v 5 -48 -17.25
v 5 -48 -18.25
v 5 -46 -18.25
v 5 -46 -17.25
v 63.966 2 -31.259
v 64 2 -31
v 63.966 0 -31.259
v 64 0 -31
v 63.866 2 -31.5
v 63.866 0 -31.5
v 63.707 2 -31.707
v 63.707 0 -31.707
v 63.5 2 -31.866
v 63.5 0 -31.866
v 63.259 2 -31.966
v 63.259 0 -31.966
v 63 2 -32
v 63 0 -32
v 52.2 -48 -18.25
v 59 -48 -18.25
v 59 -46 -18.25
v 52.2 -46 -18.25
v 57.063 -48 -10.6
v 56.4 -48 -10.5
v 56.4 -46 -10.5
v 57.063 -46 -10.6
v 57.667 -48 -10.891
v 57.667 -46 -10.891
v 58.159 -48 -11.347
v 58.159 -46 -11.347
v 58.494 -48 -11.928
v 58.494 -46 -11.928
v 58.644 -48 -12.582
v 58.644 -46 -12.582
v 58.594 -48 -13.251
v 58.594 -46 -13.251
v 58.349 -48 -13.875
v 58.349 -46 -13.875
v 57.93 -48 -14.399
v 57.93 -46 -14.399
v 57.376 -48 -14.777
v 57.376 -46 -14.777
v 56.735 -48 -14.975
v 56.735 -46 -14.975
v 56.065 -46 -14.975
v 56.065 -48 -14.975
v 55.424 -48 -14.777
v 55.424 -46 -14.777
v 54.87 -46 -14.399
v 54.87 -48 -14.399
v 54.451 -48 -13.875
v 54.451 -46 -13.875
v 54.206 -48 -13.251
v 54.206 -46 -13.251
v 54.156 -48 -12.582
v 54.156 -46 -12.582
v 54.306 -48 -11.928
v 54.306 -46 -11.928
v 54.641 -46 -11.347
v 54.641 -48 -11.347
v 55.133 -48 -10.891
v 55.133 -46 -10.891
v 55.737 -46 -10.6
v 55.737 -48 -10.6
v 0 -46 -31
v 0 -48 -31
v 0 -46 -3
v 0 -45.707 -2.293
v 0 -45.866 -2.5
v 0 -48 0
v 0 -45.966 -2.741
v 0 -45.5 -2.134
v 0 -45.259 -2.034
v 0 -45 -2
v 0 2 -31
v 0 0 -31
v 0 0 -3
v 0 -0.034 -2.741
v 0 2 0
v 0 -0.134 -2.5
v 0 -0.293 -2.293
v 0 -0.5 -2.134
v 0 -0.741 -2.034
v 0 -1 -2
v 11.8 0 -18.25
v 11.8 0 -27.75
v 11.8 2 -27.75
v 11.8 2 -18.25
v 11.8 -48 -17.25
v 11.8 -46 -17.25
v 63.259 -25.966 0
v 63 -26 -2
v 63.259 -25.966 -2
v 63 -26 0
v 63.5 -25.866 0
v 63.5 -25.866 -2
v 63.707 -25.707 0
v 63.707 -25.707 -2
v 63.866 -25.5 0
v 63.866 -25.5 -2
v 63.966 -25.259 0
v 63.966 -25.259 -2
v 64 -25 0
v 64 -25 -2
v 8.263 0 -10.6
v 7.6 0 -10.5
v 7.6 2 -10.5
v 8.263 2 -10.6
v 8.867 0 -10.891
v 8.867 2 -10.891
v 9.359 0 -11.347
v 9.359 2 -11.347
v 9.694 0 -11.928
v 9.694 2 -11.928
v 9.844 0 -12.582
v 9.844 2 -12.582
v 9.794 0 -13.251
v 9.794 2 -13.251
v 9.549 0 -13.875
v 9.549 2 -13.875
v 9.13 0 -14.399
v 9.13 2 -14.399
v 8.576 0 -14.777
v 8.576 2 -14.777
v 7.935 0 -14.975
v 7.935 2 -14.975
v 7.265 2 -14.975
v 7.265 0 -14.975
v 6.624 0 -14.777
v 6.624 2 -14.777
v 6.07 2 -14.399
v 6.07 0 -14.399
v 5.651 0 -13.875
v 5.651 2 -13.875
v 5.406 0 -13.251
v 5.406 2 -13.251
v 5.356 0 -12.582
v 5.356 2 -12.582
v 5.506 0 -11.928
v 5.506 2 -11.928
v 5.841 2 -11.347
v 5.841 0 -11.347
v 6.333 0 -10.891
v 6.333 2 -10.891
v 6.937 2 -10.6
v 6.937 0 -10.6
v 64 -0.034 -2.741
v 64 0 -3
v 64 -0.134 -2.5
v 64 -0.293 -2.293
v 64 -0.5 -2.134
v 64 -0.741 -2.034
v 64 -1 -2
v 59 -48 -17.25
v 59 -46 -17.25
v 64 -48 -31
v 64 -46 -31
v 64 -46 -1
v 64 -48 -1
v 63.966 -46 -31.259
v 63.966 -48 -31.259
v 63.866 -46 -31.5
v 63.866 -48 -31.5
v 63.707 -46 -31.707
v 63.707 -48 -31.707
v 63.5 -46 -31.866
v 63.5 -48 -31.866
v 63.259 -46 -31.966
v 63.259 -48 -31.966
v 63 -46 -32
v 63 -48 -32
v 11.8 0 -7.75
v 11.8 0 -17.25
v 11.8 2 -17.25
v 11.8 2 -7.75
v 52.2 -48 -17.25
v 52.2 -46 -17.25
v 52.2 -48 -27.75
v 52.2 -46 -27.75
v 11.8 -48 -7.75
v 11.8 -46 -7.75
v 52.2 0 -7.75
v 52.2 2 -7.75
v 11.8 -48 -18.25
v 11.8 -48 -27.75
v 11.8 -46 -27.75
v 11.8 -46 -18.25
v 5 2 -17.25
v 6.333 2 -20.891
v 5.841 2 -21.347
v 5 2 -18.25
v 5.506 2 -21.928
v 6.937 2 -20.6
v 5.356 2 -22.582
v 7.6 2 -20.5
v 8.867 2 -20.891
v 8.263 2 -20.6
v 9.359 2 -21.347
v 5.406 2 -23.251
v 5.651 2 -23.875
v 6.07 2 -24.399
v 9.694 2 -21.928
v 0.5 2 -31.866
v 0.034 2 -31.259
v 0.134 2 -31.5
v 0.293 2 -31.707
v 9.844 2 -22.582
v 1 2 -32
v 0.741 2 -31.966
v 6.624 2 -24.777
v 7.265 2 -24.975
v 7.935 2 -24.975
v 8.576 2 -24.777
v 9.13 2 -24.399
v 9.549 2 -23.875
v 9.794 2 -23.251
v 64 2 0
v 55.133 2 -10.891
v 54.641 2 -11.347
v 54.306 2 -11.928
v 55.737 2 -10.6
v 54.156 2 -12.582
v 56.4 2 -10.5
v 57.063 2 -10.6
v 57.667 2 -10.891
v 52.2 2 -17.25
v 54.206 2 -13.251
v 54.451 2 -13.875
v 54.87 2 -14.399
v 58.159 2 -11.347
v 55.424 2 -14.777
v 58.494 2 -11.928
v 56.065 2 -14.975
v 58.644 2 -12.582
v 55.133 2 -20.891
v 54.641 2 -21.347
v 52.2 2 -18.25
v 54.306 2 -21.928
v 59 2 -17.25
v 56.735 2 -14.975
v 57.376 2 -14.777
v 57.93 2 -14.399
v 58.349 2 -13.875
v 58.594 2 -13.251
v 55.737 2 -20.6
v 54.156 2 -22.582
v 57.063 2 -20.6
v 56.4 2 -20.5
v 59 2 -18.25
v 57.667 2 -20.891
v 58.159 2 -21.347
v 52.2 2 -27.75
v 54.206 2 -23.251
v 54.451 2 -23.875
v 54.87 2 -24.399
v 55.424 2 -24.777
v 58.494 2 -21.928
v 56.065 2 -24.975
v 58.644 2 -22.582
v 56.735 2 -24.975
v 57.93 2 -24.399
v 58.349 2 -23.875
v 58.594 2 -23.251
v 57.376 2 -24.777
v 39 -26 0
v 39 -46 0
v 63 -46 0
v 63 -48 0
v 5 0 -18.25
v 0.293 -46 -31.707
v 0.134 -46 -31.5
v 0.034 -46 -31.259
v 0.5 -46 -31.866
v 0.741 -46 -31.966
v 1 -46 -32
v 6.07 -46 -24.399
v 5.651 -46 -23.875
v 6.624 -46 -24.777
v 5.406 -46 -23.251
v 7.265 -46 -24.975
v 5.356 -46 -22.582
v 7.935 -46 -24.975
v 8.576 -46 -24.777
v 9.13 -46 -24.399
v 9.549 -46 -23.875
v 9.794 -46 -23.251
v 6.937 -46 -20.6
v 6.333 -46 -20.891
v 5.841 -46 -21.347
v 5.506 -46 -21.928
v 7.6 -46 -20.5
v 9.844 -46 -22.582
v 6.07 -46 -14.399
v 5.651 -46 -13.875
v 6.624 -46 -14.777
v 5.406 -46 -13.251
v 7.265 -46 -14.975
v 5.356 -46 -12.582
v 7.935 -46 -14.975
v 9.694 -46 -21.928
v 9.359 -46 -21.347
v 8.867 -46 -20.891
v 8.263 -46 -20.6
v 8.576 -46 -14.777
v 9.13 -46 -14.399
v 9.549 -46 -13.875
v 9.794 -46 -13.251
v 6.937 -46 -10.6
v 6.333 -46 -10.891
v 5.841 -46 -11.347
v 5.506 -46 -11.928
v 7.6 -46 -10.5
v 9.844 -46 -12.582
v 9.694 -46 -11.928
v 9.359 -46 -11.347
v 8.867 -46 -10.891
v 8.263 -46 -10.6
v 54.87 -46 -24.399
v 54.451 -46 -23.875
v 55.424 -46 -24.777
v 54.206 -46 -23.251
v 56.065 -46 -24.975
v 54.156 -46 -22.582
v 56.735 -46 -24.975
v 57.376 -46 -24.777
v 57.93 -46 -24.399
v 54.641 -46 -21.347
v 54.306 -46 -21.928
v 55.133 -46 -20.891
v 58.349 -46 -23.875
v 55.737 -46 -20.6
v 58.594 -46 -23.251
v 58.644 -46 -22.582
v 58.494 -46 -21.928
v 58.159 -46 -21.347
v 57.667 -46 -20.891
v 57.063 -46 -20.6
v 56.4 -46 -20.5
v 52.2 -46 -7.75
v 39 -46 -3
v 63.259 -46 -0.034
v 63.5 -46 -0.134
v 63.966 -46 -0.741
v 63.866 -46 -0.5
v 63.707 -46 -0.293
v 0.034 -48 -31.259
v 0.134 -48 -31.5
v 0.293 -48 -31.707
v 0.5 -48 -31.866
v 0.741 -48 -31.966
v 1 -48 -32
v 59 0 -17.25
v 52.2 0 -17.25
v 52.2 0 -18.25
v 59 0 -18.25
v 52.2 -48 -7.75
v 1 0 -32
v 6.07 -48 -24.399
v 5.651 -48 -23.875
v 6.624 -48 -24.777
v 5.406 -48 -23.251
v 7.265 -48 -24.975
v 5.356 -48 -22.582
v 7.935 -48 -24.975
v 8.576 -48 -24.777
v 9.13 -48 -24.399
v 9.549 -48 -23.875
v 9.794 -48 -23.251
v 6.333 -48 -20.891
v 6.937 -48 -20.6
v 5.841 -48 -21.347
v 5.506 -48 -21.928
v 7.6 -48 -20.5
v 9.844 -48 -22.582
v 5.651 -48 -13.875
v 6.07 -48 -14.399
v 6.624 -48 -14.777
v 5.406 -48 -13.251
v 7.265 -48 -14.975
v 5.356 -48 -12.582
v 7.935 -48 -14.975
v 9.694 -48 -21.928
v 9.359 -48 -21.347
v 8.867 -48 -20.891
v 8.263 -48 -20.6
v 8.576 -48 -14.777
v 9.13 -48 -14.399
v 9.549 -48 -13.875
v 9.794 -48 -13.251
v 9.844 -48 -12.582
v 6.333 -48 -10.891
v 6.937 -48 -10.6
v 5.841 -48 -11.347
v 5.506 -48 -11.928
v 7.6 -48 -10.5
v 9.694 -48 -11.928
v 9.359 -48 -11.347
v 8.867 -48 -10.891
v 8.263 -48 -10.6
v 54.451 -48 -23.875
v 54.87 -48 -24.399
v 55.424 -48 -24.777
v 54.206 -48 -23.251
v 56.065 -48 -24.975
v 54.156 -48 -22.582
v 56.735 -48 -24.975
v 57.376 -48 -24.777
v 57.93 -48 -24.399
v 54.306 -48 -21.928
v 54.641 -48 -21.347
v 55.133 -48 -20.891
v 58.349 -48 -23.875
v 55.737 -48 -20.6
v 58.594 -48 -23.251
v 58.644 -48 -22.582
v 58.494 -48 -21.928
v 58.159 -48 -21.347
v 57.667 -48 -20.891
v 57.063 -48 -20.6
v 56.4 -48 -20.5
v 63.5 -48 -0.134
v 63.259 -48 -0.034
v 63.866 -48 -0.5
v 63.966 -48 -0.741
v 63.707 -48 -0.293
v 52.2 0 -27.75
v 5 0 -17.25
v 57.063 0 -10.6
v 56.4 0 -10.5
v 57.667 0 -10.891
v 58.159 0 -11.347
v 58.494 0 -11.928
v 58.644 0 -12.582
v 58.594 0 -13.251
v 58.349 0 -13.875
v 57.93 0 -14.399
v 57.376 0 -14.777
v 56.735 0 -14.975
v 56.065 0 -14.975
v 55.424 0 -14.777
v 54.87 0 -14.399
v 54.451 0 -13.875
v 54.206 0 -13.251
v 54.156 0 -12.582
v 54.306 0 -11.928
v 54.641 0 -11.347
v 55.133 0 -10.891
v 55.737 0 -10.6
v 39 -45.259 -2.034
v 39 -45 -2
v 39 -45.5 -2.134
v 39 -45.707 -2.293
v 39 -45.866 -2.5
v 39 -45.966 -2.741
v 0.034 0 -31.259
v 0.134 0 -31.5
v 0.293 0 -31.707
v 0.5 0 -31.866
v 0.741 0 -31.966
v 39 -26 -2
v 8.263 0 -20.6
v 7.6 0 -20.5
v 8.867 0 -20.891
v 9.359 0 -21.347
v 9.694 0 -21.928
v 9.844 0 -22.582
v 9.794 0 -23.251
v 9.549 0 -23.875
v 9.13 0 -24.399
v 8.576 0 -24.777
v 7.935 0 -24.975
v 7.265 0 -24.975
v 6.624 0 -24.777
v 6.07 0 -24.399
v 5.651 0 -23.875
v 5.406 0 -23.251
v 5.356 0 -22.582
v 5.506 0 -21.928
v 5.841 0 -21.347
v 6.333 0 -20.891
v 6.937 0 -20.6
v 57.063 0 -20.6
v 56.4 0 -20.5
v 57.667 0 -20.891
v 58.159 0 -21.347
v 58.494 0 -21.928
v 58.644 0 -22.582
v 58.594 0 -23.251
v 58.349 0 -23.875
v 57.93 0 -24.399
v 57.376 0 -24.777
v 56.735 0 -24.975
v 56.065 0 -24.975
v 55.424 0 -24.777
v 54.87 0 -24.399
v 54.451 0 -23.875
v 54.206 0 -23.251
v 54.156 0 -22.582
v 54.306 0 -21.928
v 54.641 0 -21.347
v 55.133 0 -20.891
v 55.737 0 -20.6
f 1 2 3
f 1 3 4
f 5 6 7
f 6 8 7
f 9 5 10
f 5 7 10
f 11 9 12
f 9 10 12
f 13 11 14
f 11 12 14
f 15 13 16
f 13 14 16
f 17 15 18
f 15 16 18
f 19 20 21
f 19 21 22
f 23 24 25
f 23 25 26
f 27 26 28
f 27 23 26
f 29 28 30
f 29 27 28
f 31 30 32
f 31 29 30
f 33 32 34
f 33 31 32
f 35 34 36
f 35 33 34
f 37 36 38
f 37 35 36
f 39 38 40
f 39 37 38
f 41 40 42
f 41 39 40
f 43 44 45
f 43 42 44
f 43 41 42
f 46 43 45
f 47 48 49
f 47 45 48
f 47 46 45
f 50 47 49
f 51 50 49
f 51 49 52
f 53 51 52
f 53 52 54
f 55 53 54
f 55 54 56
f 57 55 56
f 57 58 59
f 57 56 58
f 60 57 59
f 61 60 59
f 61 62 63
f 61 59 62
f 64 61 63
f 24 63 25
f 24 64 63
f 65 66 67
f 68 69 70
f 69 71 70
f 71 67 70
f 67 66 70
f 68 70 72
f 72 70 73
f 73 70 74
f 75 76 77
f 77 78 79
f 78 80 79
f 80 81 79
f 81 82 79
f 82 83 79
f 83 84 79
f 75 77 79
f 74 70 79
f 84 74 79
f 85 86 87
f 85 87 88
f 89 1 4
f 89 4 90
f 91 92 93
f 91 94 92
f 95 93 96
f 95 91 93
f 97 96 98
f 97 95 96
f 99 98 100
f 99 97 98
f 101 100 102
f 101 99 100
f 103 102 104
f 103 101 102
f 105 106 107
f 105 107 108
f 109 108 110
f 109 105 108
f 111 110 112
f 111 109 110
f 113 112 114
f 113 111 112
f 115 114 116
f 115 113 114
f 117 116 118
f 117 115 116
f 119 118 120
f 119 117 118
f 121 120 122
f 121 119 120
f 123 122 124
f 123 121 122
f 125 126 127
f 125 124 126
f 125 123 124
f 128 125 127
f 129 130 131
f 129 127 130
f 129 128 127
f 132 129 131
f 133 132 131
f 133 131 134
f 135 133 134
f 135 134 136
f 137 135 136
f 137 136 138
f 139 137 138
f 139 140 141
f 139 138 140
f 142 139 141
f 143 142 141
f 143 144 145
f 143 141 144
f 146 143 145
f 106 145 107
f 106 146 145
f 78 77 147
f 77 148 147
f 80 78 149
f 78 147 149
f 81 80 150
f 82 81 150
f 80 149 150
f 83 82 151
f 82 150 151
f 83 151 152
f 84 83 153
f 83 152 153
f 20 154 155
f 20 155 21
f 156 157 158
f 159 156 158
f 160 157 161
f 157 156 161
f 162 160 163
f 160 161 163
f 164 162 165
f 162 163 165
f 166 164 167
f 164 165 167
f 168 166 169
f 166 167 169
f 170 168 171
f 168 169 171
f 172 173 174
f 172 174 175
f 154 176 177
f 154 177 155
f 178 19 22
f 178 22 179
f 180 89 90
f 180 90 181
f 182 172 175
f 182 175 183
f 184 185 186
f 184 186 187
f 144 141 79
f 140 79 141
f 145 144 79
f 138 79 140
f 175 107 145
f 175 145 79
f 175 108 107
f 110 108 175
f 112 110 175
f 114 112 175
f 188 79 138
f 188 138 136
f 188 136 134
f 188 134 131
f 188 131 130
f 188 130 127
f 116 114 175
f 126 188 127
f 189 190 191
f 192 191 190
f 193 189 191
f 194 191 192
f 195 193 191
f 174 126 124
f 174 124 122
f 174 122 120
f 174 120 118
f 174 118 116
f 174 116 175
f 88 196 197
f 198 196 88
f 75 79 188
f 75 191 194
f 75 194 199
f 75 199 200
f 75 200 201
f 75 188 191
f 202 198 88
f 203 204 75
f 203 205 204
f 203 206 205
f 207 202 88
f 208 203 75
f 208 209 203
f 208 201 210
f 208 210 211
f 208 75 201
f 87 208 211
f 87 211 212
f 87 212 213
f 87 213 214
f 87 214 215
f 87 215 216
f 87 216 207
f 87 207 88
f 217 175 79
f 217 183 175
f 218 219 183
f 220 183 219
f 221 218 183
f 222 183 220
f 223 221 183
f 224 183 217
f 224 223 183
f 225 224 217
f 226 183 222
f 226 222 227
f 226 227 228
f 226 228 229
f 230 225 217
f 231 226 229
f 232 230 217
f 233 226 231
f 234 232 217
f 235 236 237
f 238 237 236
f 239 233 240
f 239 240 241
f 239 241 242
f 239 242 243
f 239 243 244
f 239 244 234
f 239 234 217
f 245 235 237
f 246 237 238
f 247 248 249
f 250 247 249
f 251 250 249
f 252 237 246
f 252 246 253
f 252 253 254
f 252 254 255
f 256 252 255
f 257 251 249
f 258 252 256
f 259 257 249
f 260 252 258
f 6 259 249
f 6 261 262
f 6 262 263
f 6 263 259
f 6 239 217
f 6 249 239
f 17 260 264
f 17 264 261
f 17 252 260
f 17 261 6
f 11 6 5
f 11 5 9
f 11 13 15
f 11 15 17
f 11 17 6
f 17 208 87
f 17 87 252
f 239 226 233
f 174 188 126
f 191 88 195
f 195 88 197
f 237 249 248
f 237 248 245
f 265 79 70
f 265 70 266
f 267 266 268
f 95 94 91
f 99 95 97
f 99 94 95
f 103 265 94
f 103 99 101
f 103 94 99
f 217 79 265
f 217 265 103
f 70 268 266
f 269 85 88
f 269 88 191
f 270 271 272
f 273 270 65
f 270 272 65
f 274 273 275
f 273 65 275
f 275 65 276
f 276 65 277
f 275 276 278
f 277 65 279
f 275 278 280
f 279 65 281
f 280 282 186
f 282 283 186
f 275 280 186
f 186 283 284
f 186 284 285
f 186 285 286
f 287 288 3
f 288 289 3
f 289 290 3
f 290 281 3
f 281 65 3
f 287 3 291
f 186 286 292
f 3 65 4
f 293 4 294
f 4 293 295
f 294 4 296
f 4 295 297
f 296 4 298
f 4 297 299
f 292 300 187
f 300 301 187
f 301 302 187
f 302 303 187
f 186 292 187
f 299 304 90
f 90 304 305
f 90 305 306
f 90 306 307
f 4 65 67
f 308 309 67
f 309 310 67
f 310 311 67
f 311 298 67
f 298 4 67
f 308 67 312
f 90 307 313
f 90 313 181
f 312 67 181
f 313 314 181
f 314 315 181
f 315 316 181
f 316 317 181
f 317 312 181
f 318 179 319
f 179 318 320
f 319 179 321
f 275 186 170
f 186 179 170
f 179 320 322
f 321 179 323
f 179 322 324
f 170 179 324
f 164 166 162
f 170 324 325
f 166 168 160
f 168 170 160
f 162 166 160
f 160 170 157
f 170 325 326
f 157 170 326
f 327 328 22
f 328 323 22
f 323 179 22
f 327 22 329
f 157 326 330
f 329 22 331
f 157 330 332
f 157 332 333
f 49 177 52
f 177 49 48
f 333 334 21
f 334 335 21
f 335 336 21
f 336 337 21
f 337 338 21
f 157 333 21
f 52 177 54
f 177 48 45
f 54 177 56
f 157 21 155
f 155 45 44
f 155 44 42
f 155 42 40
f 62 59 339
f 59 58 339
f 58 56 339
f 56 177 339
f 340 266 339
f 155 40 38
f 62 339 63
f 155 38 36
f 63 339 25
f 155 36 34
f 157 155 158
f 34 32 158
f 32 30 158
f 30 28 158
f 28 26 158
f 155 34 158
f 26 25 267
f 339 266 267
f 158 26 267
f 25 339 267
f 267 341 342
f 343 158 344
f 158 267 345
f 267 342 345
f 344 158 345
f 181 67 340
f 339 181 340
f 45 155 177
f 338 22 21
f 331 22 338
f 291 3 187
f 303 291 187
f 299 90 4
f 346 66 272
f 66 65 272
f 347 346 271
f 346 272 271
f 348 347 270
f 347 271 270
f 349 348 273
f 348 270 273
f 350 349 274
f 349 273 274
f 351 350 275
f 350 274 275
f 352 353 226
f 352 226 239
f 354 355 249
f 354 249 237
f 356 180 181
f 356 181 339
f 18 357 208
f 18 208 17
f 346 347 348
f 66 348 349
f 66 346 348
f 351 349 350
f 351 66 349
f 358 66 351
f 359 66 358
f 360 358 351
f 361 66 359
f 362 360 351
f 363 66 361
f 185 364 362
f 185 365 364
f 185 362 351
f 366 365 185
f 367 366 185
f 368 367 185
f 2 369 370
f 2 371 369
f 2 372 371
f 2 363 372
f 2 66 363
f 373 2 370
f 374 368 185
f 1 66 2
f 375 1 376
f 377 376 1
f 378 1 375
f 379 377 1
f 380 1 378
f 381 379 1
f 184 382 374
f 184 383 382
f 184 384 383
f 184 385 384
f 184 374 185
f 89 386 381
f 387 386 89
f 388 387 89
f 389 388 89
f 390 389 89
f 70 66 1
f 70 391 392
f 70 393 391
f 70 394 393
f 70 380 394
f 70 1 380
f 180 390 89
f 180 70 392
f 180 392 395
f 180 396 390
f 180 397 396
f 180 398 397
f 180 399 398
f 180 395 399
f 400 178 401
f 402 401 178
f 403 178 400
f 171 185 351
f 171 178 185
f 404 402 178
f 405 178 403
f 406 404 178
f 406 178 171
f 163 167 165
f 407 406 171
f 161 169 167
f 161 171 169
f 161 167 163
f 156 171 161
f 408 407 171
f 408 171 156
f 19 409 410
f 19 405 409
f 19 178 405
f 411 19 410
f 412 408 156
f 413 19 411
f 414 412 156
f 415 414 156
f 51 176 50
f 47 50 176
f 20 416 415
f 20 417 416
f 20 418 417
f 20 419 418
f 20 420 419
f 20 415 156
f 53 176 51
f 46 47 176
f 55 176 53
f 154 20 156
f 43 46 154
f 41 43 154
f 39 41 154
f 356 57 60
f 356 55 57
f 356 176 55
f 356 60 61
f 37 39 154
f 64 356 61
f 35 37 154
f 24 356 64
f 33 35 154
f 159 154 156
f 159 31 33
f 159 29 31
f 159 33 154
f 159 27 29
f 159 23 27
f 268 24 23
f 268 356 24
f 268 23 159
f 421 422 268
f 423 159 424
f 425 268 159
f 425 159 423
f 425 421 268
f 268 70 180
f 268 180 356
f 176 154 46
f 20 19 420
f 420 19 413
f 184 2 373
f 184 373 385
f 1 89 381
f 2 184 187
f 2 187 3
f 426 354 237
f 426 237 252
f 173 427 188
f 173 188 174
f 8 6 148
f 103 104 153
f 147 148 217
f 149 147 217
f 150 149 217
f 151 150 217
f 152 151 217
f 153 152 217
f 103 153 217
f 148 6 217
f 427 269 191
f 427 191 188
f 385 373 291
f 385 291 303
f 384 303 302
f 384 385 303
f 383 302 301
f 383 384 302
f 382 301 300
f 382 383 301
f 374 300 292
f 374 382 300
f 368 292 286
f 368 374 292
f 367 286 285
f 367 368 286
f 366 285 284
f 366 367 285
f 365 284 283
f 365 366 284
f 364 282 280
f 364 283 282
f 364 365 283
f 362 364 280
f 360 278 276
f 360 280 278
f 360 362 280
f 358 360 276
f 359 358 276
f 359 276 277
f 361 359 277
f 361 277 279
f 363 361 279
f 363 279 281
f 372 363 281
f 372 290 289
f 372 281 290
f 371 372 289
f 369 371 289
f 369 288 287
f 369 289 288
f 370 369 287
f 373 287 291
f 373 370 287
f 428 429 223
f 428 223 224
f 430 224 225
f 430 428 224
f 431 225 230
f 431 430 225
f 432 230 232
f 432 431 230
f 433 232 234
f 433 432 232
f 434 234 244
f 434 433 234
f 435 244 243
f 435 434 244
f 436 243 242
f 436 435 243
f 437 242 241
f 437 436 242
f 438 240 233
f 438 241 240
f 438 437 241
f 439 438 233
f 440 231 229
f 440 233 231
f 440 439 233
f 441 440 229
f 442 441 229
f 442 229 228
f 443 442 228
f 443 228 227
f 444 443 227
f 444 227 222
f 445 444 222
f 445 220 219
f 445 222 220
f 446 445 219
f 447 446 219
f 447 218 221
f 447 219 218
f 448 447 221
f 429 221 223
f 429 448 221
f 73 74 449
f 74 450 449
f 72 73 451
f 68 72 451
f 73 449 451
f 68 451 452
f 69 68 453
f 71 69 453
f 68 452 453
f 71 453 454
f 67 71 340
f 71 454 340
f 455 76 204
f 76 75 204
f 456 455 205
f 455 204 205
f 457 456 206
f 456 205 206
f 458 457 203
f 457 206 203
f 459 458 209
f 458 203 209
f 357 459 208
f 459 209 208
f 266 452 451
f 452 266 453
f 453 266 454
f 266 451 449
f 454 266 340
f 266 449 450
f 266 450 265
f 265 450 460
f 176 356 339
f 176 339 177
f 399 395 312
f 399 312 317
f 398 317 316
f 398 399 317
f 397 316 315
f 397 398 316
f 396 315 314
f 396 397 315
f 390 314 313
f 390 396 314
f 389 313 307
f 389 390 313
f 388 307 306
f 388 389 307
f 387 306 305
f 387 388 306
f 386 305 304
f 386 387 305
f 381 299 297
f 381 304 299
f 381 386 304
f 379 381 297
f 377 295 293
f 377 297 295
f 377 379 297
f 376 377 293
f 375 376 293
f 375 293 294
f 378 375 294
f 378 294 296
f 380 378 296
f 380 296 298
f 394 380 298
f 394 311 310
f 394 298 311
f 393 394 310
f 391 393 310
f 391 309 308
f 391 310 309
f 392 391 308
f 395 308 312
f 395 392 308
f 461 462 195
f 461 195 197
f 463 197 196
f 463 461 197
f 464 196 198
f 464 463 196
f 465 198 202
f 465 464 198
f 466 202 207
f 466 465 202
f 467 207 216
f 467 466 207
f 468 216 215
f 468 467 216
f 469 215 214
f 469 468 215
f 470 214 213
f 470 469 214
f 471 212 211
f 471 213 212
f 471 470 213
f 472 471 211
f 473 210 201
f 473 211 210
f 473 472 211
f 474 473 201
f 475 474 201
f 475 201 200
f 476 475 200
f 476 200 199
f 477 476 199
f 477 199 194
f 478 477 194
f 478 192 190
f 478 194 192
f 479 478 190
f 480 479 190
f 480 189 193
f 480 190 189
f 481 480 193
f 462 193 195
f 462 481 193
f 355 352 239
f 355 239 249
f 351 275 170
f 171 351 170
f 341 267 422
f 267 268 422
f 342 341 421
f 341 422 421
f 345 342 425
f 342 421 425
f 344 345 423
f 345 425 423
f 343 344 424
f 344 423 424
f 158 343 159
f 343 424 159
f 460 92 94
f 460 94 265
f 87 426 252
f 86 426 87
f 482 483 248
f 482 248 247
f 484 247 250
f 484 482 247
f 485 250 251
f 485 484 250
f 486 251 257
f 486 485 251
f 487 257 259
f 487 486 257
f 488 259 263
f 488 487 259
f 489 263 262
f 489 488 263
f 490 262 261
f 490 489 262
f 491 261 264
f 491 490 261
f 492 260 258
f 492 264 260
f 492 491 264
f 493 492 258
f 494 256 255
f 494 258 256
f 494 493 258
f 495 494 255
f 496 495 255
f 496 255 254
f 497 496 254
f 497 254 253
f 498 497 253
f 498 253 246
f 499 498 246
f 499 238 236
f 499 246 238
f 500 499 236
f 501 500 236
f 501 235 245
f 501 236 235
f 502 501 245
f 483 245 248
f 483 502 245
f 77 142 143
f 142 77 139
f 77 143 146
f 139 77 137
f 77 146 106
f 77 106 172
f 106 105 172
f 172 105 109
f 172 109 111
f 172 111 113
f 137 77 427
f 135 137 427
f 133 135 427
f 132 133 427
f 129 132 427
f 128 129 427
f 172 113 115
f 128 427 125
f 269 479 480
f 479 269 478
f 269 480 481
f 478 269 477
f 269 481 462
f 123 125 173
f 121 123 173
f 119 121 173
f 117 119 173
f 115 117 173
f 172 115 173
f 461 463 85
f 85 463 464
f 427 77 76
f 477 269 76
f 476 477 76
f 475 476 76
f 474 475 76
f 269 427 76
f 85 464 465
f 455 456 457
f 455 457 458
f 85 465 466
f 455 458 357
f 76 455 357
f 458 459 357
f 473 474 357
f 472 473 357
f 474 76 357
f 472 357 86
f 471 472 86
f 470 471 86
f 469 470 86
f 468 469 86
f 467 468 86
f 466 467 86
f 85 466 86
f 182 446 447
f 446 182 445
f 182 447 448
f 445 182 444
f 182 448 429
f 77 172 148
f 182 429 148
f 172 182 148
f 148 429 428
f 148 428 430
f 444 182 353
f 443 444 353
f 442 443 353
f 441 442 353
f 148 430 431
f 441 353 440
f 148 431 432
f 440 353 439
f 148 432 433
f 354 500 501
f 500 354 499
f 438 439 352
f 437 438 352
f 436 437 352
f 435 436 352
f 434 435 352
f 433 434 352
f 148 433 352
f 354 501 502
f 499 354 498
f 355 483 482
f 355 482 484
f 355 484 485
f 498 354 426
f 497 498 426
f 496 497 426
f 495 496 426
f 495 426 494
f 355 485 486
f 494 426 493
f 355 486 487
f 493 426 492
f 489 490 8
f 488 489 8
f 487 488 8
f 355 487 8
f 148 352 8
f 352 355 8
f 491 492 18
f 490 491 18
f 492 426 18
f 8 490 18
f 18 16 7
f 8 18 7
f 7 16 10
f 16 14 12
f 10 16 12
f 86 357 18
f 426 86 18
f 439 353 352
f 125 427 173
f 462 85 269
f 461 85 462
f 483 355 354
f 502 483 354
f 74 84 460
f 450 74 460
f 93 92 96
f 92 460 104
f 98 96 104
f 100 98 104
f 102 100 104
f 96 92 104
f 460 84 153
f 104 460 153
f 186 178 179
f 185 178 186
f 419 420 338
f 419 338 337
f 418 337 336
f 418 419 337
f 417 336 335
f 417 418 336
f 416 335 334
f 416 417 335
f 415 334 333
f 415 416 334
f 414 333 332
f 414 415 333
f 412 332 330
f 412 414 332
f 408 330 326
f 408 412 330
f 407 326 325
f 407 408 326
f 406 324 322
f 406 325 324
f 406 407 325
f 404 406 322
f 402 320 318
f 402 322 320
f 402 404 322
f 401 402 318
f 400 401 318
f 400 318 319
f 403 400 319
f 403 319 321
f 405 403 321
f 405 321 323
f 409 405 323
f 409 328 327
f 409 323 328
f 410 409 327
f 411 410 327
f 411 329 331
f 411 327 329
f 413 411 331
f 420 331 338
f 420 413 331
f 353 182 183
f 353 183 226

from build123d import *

# Parameters (mm, degrees)
SKETCH1_W               = 100
SKETCH1_H               = 32
BOSS_EXTRUDE1_DEPTH     = 2
SKETCH2_W               = 100
SKETCH2_H               = 2
BOSS_EXTRUDE2_DEPTH     = 46
SKETCH3_W               = 100
SKETCH3_H               = 2
BOSS_EXTRUDE3_DEPTH     = 32
CUT_EXTRUDE1_DEPTH      = 117.292734081
CUT_EXTRUDE1_DEPTH_BACK = 117.292734081
SKETCH4_R               = 2.25
CUT_EXTRUDE2_DEPTH      = 117.292734081
CUT_EXTRUDE2_DEPTH_BACK = 117.292734081
SKETCH5_W               = 36
SKETCH5_H               = 32
SKETCH6_W               = 25
SKETCH6_H               = 20
CUT_EXTRUDE3_DEPTH      = 2
FILLET1_R               = 1


with BuildPart() as part:
    # Sketch1 → Boss-Extrude1 (new body)
    with BuildSketch(Plane(origin=(0, 0, 0), x_dir=(1, 0, 0), z_dir=(0, 1, 0))):
        with Locations((50, 16)):
            Rectangle(SKETCH1_W, SKETCH1_H)
    extrude(amount=BOSS_EXTRUDE1_DEPTH)

    # Sketch2 → Boss-Extrude2 (add)
    with BuildSketch(Plane.XZ):
        with Locations((50, -1)):
            Rectangle(SKETCH2_W, SKETCH2_H)
    extrude(amount=BOSS_EXTRUDE2_DEPTH)

    # Sketch3 → Boss-Extrude3 (add)
    with BuildSketch(Plane.XY):
        with Locations((50, -47)):
            Rectangle(SKETCH3_W, SKETCH3_H)
    extrude(amount=-BOSS_EXTRUDE3_DEPTH)

    # Sketch4 → Cut-Extrude1 (cut, two sides: drawn at the far end of the back side and taken through both)
    with BuildSketch(Plane(origin=(0, 2, 0), x_dir=(1, 0, 0), z_dir=(0, 1, 0)).offset(-CUT_EXTRUDE1_DEPTH_BACK)):
        with Locations(Location((7.6, 22.75, 0), (0, 0, 270))):
            Circle(SKETCH4_R)
        with Locations(Location((56.4, 22.75, 0), (0, 0, 270))):
            Circle(SKETCH4_R)
        with Locations(Location((56.4, 12.75, 0), (0, 0, 270))):
            Circle(SKETCH4_R)
        Polygon((52.2, 17.25), (59, 17.25), (59, 18.25), (52.2, 18.25), (52.2, 27.75), (11.8, 27.75), (11.8, 18.25), (5, 18.25), (5, 17.25), (11.8, 17.25), (11.8, 7.75), (52.2, 7.75), align=None)
        with Locations(Location((7.6, 12.75, 0), (0, 0, 270))):
            Circle(SKETCH4_R)
    extrude(amount=CUT_EXTRUDE1_DEPTH + CUT_EXTRUDE1_DEPTH_BACK, mode=Mode.SUBTRACT)

    # Sketch5 → Cut-Extrude2 (cut, two sides: drawn at the far end of the back side and taken through both)
    with BuildSketch(Plane.XZ.offset(48).offset(-CUT_EXTRUDE2_DEPTH_BACK)):
        with Locations((82, -16)):
            Rectangle(SKETCH5_W, SKETCH5_H)
    extrude(amount=CUT_EXTRUDE2_DEPTH + CUT_EXTRUDE2_DEPTH_BACK, mode=Mode.SUBTRACT)

    # Sketch6 → Cut-Extrude3 (cut)
    with BuildSketch(Plane(origin=(0, 0, -2), x_dir=(-1, 0, 0), z_dir=(0, 0, -1))):
        with Locations((-51.5, -36)):
            Rectangle(SKETCH6_W, SKETCH6_H)
    extrude(amount=-CUT_EXTRUDE3_DEPTH, mode=Mode.SUBTRACT)

    # Fillet1
    fillet1_edges = [part.edges().sort_by_distance(p)[0] for p in [
        (0, 1, -32),
        (0, -47, -32),
        (64, -47, -32),
        (64, 1, -32),
        (32, 0, -2),
        (19.5, -46, -2),
        (64, -47, 0),
        (64, -26, -1),
    ]]
    fillet(fillet1_edges, radius=FILLET1_R)


solid = part.part
